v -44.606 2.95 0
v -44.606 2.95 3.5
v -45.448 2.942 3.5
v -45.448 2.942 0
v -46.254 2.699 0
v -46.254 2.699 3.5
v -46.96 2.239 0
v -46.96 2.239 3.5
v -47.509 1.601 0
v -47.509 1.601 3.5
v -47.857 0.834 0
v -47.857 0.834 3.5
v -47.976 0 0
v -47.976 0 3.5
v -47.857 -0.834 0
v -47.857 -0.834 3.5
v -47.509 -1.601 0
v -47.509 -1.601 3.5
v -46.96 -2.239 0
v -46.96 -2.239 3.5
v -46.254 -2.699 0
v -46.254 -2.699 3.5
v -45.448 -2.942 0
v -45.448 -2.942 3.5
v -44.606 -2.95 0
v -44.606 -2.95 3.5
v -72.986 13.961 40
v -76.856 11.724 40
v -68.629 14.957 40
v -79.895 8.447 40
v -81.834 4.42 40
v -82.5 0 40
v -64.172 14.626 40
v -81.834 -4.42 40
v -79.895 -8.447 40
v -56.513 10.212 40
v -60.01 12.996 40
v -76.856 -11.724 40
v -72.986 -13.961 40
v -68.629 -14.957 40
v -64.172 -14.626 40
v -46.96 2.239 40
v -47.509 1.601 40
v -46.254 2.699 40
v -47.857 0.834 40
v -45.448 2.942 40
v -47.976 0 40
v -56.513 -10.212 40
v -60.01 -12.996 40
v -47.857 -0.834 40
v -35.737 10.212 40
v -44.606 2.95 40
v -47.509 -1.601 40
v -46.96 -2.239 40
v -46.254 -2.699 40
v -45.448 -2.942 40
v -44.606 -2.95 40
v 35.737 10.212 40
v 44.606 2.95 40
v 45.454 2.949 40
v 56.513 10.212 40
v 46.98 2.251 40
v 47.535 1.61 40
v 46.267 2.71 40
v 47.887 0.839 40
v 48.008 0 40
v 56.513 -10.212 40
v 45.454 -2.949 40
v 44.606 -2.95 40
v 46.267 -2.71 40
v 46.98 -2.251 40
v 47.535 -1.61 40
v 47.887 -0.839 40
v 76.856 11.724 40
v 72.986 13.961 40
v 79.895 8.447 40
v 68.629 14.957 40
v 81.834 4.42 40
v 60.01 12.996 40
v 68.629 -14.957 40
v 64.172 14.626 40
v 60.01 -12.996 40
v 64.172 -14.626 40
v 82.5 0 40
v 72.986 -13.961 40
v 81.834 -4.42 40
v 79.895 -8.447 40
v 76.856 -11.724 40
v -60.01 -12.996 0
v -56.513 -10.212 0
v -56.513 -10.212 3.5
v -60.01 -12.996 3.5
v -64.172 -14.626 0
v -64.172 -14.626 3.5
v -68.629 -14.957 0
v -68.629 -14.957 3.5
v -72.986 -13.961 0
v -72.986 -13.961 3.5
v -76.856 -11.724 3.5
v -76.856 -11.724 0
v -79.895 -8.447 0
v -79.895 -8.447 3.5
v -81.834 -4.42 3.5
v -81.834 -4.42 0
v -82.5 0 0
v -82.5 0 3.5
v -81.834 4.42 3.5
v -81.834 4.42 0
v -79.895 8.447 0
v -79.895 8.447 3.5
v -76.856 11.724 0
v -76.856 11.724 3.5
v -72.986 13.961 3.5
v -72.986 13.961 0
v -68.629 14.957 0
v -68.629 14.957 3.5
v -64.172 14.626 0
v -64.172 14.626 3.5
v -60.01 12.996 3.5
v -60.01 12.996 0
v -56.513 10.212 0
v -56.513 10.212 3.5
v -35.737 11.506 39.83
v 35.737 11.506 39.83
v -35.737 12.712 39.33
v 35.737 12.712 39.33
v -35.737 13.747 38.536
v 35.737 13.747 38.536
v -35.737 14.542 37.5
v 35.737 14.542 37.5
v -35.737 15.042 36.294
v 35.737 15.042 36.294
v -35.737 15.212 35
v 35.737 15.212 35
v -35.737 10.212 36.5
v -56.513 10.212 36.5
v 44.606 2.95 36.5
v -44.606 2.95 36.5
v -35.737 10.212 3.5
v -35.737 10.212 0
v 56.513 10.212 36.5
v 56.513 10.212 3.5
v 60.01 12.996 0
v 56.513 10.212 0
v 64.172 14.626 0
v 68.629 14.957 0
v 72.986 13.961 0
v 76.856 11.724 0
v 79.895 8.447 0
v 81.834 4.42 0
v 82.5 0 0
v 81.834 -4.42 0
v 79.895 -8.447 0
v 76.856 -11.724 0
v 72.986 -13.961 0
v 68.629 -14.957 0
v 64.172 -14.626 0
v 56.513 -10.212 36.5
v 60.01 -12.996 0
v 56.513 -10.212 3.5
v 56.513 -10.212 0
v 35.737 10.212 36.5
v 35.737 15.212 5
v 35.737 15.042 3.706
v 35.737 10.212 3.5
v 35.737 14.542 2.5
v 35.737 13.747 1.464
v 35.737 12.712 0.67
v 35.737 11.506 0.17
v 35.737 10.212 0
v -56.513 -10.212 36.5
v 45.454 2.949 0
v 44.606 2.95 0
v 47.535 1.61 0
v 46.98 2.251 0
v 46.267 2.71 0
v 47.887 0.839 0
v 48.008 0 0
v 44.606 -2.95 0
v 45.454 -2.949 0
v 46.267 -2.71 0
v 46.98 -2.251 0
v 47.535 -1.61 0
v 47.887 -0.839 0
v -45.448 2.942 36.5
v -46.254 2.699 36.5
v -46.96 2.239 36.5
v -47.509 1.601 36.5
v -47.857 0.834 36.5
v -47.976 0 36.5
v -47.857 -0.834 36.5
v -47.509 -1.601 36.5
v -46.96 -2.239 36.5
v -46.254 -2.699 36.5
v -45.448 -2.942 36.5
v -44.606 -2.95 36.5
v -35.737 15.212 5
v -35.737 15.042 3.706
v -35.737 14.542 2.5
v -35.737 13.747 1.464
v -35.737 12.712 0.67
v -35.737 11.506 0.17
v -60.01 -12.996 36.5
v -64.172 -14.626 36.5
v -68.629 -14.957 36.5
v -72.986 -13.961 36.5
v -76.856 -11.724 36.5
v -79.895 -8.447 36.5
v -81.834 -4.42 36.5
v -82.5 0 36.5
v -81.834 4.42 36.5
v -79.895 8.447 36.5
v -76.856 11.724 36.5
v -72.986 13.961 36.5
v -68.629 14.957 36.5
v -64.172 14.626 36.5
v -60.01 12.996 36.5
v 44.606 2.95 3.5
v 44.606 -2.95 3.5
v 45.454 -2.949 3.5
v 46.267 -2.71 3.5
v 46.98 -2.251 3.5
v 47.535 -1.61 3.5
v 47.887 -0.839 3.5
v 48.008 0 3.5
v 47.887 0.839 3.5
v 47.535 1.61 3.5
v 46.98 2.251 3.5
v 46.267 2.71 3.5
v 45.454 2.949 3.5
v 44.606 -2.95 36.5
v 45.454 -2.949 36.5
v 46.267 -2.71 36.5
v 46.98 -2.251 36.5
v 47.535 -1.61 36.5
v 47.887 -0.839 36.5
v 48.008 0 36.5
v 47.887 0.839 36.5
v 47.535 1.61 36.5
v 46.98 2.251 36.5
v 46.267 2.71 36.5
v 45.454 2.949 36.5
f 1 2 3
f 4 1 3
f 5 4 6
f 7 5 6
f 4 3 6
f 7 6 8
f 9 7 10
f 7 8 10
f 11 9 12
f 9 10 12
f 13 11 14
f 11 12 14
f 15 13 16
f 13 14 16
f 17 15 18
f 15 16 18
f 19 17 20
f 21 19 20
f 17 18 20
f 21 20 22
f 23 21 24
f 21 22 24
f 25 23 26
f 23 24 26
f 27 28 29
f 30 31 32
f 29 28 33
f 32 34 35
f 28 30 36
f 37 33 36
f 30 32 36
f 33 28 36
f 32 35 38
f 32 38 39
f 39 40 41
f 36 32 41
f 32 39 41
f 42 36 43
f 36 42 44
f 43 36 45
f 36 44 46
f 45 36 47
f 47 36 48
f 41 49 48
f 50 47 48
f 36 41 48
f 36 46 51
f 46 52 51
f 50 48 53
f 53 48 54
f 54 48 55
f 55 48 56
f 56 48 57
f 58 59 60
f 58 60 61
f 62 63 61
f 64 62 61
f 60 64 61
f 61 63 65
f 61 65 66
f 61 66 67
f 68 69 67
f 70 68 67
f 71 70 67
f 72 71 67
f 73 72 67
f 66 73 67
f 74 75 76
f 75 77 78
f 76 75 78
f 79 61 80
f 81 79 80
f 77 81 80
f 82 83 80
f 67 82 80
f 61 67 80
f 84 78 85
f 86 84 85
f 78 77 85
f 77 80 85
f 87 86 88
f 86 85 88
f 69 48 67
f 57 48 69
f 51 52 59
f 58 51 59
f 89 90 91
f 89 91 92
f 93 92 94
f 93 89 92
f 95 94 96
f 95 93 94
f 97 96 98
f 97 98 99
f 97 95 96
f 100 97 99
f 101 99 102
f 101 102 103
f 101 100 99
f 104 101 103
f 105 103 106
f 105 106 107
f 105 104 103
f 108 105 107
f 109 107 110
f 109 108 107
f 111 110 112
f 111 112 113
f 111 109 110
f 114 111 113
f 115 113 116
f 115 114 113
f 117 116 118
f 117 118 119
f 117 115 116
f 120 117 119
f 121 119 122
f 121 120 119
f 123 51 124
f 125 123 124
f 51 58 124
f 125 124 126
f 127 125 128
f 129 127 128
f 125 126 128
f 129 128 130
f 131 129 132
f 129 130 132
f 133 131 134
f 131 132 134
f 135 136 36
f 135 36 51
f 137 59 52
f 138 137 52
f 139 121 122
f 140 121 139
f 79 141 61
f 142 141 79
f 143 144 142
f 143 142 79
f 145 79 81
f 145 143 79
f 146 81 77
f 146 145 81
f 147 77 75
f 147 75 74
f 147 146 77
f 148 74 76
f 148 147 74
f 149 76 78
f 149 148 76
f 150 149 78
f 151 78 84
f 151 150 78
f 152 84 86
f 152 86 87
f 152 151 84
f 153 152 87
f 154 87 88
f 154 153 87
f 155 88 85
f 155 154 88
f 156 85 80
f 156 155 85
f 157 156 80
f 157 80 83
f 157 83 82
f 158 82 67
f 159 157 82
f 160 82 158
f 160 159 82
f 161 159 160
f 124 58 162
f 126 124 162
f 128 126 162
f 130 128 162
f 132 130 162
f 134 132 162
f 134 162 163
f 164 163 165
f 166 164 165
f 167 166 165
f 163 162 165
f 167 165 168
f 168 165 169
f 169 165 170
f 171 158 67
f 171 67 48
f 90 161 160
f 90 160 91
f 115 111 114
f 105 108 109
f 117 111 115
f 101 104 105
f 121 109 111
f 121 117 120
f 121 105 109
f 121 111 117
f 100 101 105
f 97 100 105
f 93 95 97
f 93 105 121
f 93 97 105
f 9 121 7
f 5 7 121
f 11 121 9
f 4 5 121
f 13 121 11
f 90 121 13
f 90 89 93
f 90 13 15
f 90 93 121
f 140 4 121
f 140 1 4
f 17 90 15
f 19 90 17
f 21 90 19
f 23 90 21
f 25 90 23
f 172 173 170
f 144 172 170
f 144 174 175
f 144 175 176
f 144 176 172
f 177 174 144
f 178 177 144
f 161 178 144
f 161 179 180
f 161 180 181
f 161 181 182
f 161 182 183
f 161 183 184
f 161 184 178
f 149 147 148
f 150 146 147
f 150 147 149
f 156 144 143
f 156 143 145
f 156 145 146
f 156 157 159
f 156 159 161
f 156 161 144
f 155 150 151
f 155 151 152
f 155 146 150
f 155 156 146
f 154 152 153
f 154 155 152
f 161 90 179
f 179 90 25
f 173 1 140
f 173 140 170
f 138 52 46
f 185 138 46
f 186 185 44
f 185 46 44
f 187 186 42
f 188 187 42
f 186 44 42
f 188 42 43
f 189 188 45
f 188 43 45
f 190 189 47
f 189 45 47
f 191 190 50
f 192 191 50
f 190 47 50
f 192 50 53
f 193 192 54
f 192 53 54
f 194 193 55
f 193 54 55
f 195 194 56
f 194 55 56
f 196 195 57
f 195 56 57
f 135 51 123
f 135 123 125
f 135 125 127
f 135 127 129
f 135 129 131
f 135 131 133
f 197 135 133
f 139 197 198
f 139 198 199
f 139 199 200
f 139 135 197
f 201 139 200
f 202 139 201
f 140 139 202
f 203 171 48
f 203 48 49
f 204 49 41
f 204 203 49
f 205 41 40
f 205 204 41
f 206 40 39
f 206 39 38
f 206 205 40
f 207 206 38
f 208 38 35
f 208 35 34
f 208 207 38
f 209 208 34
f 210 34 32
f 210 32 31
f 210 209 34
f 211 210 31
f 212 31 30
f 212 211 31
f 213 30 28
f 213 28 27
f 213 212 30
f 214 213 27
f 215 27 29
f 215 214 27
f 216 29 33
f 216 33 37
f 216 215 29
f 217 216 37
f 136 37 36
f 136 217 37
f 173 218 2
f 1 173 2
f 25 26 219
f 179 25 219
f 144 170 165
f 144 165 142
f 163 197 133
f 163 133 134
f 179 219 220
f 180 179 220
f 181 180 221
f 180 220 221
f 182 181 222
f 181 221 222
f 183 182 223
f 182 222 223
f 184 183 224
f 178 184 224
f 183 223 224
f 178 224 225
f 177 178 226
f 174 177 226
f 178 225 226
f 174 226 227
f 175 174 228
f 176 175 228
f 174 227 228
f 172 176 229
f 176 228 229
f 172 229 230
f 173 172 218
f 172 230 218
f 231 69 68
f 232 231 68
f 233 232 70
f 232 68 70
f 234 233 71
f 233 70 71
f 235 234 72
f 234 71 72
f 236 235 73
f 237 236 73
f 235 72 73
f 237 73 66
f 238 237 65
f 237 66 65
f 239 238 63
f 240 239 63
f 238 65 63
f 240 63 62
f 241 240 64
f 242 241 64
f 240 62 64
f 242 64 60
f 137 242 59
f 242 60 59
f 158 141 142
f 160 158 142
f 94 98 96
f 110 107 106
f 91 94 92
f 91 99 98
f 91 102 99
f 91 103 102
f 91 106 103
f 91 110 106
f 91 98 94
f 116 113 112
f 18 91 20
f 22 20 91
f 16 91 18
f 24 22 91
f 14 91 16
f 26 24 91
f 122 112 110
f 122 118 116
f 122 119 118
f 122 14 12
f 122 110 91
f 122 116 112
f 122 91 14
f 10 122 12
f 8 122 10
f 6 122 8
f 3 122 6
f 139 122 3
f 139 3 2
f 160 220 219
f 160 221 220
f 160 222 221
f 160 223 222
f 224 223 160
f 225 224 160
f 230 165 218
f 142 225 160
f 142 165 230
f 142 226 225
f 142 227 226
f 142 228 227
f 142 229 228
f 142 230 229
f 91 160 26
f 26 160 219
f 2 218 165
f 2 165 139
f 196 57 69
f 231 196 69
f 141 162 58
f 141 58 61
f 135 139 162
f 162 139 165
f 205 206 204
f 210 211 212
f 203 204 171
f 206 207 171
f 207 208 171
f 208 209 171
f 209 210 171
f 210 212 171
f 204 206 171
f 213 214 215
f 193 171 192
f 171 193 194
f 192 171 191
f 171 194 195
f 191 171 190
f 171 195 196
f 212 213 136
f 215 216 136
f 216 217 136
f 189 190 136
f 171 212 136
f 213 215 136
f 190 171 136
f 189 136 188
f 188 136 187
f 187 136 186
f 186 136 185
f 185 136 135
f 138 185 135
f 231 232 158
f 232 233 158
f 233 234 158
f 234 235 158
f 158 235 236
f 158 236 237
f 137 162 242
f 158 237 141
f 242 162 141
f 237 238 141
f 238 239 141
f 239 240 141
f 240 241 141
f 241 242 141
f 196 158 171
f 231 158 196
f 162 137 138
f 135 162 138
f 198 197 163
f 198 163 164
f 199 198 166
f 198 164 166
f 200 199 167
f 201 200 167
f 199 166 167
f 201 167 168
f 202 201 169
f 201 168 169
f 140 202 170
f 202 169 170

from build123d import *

# Parameters (mm, degrees)
BOSS_EXTRUDE1_DEPTH     = 40
CUT_EXTRUDE1_DEPTH      = 60
SKETCH3_W               = 113.025821482
SKETCH3_H               = 33
CUT_EXTRUDE2_DEPTH      = 25
CUT_EXTRUDE6_DEPTH      = 96.088865234
CUT_EXTRUDE6_DEPTH_BACK = 96.088865234
SKETCH7_W               = 50
SKETCH7_H               = 33
SKETCH8_W               = 71.47426929
SKETCH8_H               = 40
BOSS_EXTRUDE2_DEPTH     = 5
FILLET1_R               = 5
FILLET2_R               = 5


with BuildPart() as part:
    # Sketch1 → Boss-Extrude1 (new body)
    with BuildSketch(Plane.XY):
        with BuildLine():
            Line((-56.512910741, 10.211947396), (56.512910741, 10.211947396))
            ThreePointArc((56.512910741, 10.211947396), (82.5, 0), (56.512910741, -10.211947396))
            Line((56.512910741, -10.211947396), (-56.512910741, -10.211947396))
            ThreePointArc((-56.512910741, -10.211947396), (-82.5, 0), (-56.512910741, 10.211947396))
        make_face()
    extrude(amount=BOSS_EXTRUDE1_DEPTH)

    # Sketch2 → Cut-Extrude1 (cut)
    with BuildSketch(Plane.XY.offset(50)):
        with BuildLine():
            Line((44.606109659, 2.95), (-44.606109659, 2.95))
            ThreePointArc((-44.606109659, 2.95), (-47.976180371, 0), (-44.606109659, -2.95))
            Line((-44.606109659, -2.95), (44.606109659, -2.95))
            ThreePointArc((44.606109659, -2.95), (48.007891593, 0), (44.606109659, 2.95))
        make_face()
    extrude(amount=-CUT_EXTRUDE1_DEPTH, mode=Mode.SUBTRACT)

    # Sketch3 → Cut-Extrude2 (cut)
    with BuildSketch(Plane(origin=(0, 10.211947396, 0), x_dir=(1, 0, 0), z_dir=(0, 1, 0))):
        with Locations((0, -20)):
            Rectangle(SKETCH3_W, SKETCH3_H)
    extrude(amount=-CUT_EXTRUDE2_DEPTH, mode=Mode.SUBTRACT)

    # Sketch7 → Cut-Extrude6 (cut, two sides: drawn at the far end of the back side and taken through both)
    with BuildSketch(Plane(origin=(0, 10.211947396, 0), x_dir=(-1, 0, 0), z_dir=(0, -1, 0)).offset(-CUT_EXTRUDE6_DEPTH_BACK)):
        with Locations((81.512910741, -20)):
            Rectangle(SKETCH7_W, SKETCH7_H)
    extrude(amount=CUT_EXTRUDE6_DEPTH + CUT_EXTRUDE6_DEPTH_BACK, mode=Mode.SUBTRACT)

    # Sketch8 → Boss-Extrude2 (add)
    with BuildSketch(Plane(origin=(0, 10.211947396, 0), x_dir=(1, 0, 0), z_dir=(0, 1, 0))):
        with Locations((0, -20)):
            Rectangle(SKETCH8_W, SKETCH8_H)
    extrude(amount=BOSS_EXTRUDE2_DEPTH)

    # Fillet1
    fillet1_edges = [part.edges().sort_by_distance(p)[0] for p in [
        (0, 15.211947396, 40),
    ]]
    fillet(fillet1_edges, radius=FILLET1_R)

    # Fillet2
    fillet2_edges = [part.edges().sort_by_distance(p)[0] for p in [
        (0, 15.211947396, 0),
    ]]
    fillet(fillet2_edges, radius=FILLET2_R)


solid = part.part
